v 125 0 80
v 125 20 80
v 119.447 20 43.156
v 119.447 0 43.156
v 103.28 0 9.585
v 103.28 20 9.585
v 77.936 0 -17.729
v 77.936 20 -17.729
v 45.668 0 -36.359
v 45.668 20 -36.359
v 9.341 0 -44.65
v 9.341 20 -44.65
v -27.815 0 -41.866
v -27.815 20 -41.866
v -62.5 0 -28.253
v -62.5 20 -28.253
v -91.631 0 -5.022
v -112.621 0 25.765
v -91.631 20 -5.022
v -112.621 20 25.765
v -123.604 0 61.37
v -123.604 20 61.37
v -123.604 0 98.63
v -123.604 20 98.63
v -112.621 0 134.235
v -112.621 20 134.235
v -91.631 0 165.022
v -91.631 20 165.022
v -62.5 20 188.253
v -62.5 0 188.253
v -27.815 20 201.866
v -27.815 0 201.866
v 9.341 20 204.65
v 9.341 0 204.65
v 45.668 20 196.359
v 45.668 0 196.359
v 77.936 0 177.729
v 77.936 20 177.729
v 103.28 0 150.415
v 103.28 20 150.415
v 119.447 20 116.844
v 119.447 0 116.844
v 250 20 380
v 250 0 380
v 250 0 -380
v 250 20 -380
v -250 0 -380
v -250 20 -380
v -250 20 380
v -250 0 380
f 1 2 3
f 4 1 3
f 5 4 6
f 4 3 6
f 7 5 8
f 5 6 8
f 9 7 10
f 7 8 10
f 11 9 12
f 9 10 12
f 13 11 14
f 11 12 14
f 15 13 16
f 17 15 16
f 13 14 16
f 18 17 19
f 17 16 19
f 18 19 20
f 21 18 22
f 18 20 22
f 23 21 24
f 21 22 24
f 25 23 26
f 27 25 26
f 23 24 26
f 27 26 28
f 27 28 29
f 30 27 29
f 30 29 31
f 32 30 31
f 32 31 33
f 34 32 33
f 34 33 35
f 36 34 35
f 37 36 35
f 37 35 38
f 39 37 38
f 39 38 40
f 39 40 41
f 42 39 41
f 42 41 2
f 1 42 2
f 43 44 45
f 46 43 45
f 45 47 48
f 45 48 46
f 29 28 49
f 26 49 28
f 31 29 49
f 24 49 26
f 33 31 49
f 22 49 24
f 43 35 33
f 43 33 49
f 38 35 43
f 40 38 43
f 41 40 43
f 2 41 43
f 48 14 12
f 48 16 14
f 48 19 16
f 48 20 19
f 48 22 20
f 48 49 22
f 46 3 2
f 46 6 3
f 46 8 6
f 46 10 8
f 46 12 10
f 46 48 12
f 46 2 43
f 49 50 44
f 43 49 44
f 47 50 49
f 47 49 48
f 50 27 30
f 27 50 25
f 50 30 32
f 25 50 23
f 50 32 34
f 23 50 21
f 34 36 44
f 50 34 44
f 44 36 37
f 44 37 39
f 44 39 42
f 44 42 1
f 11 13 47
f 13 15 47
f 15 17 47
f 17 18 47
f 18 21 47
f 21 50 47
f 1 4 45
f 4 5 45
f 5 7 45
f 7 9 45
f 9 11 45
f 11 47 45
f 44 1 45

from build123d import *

# Parameters (mm, degrees)
SKETCH1_W           = 500
SKETCH1_H           = 760
BOSS_EXTRUDE1_DEPTH = 20
CUT_EXTRUDE2_REACH  = 22
SKETCH3_R           = 125


with BuildPart() as part:
    # Sketch1 → Boss-Extrude1 (new body)
    with BuildSketch(Plane(origin=(0, 0, 0), x_dir=(1, 0, 0), z_dir=(0, 1, 0))):
        Rectangle(SKETCH1_W, SKETCH1_H)
    extrude(amount=BOSS_EXTRUDE1_DEPTH)

    # Sketch3 → Cut-Extrude2 (cut, up to next)
    with BuildSketch(Plane(origin=(0, 20, 0), x_dir=(1, 0, 0), z_dir=(0, 1, 0)), mode=Mode.PRIVATE) as cut_extrude2_sk1:
        with Locations((0, -80)):
            Circle(SKETCH3_R)
    cut_extrude2_tool1 = extrude(cut_extrude2_sk1.sketch, amount=-CUT_EXTRUDE2_REACH, mode=Mode.PRIVATE) & part.part
    add(cut_extrude2_tool1.solids().sort_by_distance((0, 20, 80))[0], mode=Mode.SUBTRACT)


solid = part.part
